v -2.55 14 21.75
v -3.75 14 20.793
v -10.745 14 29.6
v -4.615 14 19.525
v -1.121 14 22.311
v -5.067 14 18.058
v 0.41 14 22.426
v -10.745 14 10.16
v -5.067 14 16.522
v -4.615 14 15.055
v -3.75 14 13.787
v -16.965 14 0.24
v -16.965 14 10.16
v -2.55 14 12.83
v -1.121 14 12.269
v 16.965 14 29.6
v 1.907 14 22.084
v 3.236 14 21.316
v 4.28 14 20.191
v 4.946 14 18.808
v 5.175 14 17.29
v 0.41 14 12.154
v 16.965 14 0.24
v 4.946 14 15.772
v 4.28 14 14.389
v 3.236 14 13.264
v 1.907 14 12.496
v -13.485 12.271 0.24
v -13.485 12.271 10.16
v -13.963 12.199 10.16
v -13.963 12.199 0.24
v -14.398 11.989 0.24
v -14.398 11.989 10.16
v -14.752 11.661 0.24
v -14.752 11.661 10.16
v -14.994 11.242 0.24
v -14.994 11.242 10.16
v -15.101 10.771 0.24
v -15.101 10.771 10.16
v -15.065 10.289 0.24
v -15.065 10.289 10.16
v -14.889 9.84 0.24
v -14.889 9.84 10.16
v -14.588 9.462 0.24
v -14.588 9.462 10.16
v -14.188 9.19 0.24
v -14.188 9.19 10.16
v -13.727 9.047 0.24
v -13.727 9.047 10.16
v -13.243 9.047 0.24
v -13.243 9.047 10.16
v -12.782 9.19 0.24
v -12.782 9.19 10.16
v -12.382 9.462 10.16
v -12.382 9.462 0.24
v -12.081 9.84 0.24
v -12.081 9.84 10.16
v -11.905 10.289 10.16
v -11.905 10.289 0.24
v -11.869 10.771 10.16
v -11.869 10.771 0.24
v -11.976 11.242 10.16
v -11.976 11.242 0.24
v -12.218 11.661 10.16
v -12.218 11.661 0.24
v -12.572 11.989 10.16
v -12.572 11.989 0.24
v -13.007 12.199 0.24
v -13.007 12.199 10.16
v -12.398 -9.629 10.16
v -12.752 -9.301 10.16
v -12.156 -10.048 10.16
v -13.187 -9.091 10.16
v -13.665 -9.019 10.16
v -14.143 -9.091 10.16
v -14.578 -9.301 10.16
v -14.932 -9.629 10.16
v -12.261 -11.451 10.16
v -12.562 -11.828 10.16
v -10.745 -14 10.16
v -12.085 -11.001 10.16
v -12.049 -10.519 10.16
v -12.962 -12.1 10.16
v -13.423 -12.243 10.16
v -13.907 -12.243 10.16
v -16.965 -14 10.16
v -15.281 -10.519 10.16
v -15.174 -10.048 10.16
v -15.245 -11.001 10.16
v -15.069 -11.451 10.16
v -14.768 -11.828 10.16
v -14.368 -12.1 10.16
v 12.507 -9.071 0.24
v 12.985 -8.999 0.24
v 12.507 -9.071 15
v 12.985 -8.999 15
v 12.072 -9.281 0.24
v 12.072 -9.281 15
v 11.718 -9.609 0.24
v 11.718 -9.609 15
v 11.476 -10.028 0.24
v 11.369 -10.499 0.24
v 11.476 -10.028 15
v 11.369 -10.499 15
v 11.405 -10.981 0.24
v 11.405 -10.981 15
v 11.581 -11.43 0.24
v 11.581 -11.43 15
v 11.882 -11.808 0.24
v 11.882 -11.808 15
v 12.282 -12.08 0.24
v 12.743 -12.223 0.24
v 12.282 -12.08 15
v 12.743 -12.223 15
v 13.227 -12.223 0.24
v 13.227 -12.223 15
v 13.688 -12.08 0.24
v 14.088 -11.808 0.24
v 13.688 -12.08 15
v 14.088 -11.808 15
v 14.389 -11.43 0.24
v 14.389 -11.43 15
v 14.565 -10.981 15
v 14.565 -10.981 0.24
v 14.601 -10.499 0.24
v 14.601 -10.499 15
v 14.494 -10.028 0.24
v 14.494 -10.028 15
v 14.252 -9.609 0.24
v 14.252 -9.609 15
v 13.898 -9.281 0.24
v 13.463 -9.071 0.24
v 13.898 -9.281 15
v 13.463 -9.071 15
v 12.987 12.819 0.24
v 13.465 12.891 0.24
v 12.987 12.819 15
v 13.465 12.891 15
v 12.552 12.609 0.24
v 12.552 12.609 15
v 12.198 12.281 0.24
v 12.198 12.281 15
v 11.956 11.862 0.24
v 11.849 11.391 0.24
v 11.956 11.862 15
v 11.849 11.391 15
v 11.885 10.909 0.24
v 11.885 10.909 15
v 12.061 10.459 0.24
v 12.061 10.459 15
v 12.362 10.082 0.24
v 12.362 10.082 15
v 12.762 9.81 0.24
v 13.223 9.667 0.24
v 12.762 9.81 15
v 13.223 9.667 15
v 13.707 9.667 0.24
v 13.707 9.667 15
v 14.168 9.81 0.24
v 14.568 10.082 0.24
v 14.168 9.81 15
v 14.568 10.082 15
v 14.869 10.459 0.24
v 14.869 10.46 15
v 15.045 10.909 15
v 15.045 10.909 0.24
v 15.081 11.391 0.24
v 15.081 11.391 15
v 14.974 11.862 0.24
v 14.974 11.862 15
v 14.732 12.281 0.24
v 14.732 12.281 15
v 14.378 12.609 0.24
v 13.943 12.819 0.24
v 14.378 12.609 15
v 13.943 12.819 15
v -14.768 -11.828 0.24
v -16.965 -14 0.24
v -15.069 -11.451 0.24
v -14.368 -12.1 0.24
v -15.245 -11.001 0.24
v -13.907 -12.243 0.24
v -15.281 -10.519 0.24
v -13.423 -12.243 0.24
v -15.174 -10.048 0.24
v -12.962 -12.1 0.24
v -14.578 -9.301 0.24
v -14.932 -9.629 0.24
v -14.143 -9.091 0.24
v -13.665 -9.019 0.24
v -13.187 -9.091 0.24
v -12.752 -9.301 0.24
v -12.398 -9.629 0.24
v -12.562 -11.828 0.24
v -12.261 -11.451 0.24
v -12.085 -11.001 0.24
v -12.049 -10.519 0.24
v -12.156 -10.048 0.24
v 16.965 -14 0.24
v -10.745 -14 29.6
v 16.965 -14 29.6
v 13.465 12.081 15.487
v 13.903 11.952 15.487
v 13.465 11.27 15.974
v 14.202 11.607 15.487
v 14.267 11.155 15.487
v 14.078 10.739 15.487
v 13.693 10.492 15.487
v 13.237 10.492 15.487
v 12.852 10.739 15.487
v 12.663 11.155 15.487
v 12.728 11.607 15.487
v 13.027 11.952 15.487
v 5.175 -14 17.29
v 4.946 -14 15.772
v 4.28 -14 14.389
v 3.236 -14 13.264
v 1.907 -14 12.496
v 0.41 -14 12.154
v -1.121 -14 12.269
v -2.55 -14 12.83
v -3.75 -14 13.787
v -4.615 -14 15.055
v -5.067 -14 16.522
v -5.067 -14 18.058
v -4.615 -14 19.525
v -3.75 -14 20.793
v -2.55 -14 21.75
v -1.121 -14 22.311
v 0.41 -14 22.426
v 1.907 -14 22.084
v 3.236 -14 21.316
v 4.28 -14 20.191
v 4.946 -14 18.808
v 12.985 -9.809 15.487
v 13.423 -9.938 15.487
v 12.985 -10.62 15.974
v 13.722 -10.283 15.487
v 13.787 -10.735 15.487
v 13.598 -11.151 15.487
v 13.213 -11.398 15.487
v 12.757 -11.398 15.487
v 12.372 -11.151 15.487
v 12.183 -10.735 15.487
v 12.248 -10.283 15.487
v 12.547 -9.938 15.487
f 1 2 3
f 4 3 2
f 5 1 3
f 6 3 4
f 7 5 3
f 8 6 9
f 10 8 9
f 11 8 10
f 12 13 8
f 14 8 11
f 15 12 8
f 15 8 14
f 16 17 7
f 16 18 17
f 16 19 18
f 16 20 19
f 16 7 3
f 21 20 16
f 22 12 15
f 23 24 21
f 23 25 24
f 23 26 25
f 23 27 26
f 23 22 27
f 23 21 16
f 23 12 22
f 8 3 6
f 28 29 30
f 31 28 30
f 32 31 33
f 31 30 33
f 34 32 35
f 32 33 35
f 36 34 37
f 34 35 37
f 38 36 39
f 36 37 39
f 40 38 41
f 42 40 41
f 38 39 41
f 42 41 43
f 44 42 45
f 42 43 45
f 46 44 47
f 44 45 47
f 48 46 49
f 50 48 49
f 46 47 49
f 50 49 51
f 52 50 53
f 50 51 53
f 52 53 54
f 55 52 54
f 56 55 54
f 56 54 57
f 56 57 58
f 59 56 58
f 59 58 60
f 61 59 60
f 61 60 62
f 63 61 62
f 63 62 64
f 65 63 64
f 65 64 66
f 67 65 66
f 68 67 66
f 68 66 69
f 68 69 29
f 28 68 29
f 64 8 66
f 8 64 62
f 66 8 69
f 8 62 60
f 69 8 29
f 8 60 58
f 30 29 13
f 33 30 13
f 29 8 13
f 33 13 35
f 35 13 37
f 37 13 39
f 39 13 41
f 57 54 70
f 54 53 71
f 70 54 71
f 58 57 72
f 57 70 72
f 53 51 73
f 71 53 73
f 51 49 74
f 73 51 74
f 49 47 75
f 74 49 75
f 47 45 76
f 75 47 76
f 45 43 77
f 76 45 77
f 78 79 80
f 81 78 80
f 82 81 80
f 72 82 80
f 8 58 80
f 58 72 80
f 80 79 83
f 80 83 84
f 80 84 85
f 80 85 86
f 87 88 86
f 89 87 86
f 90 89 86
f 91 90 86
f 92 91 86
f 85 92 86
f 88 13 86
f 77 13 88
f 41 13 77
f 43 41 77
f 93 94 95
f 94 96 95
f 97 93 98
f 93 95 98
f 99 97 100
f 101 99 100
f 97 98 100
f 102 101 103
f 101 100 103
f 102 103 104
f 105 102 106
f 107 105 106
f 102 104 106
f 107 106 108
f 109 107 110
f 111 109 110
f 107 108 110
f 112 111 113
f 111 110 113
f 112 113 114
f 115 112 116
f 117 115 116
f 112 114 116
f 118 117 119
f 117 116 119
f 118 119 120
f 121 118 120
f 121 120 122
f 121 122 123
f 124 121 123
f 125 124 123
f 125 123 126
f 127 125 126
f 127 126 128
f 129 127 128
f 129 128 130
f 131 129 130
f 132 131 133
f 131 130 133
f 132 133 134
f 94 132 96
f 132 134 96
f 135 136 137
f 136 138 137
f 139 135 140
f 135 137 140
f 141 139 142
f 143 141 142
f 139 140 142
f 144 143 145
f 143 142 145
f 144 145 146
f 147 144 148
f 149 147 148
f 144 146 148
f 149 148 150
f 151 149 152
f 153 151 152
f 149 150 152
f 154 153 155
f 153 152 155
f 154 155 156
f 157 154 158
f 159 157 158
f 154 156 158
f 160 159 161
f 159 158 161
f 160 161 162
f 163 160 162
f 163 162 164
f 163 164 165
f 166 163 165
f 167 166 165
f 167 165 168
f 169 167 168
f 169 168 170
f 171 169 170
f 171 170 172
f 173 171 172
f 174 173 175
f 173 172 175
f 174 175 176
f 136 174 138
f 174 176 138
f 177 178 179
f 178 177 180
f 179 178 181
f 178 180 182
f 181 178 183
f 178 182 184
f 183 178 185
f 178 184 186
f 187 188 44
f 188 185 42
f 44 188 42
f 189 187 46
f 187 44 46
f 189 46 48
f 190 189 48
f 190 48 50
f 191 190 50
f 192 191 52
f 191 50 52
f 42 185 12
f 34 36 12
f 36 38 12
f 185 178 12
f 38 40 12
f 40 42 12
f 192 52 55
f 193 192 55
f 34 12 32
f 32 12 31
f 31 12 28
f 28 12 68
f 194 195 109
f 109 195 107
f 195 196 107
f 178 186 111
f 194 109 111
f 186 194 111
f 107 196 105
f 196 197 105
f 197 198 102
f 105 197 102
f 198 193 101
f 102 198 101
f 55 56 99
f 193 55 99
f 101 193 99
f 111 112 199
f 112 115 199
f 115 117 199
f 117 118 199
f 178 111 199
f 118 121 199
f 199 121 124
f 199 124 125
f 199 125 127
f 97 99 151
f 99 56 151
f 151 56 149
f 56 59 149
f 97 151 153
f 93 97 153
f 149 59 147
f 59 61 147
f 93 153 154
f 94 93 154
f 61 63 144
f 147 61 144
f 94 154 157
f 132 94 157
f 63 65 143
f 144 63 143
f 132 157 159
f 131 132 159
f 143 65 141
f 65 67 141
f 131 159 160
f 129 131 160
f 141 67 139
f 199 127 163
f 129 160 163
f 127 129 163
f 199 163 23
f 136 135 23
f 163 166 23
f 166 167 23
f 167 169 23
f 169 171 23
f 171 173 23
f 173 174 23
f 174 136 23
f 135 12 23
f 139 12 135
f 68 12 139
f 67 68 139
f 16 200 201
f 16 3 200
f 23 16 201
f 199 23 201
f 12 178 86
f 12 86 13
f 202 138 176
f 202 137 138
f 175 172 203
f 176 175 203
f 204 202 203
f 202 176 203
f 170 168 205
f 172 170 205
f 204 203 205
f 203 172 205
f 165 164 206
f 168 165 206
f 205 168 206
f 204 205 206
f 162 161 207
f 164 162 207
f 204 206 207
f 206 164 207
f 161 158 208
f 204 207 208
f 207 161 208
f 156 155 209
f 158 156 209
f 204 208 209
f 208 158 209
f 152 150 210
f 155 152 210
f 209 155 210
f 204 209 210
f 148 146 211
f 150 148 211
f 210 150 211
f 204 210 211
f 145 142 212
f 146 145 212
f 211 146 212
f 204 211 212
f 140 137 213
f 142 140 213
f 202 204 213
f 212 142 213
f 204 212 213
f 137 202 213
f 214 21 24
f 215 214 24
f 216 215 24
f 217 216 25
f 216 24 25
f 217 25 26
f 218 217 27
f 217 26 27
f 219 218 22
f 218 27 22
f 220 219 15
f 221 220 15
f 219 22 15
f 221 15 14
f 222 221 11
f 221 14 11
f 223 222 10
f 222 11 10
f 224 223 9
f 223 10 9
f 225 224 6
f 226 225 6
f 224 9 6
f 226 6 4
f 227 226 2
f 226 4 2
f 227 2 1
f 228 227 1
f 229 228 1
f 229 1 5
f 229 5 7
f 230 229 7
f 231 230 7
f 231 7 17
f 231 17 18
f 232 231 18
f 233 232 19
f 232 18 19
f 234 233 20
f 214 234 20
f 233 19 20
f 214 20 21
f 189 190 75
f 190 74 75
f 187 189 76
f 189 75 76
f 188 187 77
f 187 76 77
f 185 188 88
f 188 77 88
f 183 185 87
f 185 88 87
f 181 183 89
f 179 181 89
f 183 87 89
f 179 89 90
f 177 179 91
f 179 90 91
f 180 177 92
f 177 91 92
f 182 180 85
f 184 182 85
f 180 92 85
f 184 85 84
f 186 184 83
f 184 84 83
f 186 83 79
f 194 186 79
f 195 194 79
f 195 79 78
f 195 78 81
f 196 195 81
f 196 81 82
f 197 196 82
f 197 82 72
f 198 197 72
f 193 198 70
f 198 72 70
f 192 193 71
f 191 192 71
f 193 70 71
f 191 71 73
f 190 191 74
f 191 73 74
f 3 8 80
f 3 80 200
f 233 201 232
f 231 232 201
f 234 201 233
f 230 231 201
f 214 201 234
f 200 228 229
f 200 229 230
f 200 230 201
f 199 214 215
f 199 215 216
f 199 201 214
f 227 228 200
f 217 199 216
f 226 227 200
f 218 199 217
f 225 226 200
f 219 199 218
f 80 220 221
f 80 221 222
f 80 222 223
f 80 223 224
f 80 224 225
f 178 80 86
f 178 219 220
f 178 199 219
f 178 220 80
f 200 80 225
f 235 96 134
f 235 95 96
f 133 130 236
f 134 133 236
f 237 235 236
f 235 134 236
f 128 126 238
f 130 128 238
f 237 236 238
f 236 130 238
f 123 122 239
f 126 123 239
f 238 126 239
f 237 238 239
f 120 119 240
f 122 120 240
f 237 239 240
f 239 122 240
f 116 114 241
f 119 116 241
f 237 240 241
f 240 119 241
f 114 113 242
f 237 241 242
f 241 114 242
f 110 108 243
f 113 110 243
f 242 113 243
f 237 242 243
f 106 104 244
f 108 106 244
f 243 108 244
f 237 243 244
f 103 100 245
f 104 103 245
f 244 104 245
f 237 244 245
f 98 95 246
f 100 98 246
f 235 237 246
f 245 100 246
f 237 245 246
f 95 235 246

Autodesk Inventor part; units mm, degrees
ref_plane "YZ Plane" through (0, 0, 0) normal (1, 0, 0) x (0, 1, 0)
ref_plane "XZ Plane" through (0, 0, 0) normal (0, 1, 0) x (-1, 0, 0)
ref_plane "XY Plane" through (0, 0, 0) normal (0, 0, 1) x (1, 0, 0)
sketch "Sketch2" plane through (0, 0, 0) normal (0, 0, 1) x (1, 0, 0)
  line L0 (-16.965, 14) -> (16.965, 14)
  line L1 (16.965, 14) -> (16.965, -14)
  line L2 (16.965, -14) -> (-16.965, -14)
  line L3 (-16.965, -14) -> (-16.965, 14)
  line L4 (-16.965, 14) -> (16.965, -14) construction
  line L5 (16.965, 14) -> (-16.965, -14) construction
  point P0 (0, 0)
  dimension "d0" = 33.93
  dimension "d1" = 28
extrude "Extrusion1" add sketch "Sketch2" along normal blind 29.6
sketch "Sketch4" plane through (0, 0, 0) normal (0, 0, -1) x (-1, 0, 0)
  line L0 (16.965, 14) -> (16.965, -14) construction
  line L1 (-16.965, 14) -> (16.965, 14) construction
  line L2 (16.965, -14) -> (-16.965, -14) construction
  line L3 (-16.965, -14) -> (-16.965, 14) construction
  point P0 (13.485, 10.65)
  point P1 (13.665, -10.64)
  point P2 (-12.985, -10.62)
  point P3 (-13.465, 11.27)
  dimension "d11" = 3.48
  dimension "d12" = 3.3
  dimension "d13" = 3.35
  dimension "d14" = 3.36
  dimension "d15" = 3.38
  dimension "d16" = 3.98
  dimension "d17" = 3.5
  dimension "d18" = 2.73
hole "Hole1" at (13.465, 11.27, 0) at (12.985, -10.62, 0) at (-13.665, -10.64, 0) at (-13.485, 10.65, 0) direction (0, 0, 1) diameter 3.242 depth 15 tip angle 118 thread size "M4x0.7" class "6H" standard "ISO Metric profile"
sketch "Sketch3" plane through (-16.965, 14, 0) normal (0, 1, 0) x (1, 0, 0)
  circle A0 centre (16.99, -17.29) radius 5.15
  line L0 (0, 0) -> (0, -29.6) projected
  line L1 (33.93, 0) -> (0, 0) projected
  line L2 (33.93, -29.6) -> (0, -29.6) construction
  line L3 (11.84, -12.14) -> (22.14, -12.14) construction
  line L4 (22.14, -12.14) -> (22.14, -22.44) construction
  line L5 (22.14, -22.44) -> (11.84, -22.44) construction
  line L6 (11.84, -22.44) -> (11.84, -12.14) construction
  line L7 (11.84, -12.14) -> (22.14, -22.44) construction
  line L8 (22.14, -12.14) -> (11.84, -22.44) construction
  line L9 (33.93, 0) -> (33.93, -29.6) projected
  point P0 (16.965, 0)
  point P1 (0, -14.8)
  point P2 (16.965, 0)
  dimension "d4" = 10.3
  dimension "d30" = 7.16
  dimension "d32" = 11.79
extrude "Extrusion2" cut sketch "Sketch3" against normal through all
sketch "Sketch5" plane through (-16.965, -14, 0) normal (-1, 0, 0) x (0, 0, 1)
  line L0 (29.6, 0) -> (29.6, 28) projected
  line L1 (22.44, 0) -> (12.14, 0) projected
  line L2 (29.6, 28) -> (10.16, 28)
  line L3 (10.16, 28) -> (10.16, 0)
  line L4 (10.16, 0) -> (29.6, 0)
  line L5 (29.6, 0) -> (29.6, 28)
  point P0 (0, 14)
  dimension "d26" = 19.44
extrude "Extrusion3" cut sketch "Sketch5" against normal blind 6.22
move faces "Move1" translate (0, 0, 0.24) faces at (3.877, 3.4597, 0)
properties part number "Upper Z lifter"
